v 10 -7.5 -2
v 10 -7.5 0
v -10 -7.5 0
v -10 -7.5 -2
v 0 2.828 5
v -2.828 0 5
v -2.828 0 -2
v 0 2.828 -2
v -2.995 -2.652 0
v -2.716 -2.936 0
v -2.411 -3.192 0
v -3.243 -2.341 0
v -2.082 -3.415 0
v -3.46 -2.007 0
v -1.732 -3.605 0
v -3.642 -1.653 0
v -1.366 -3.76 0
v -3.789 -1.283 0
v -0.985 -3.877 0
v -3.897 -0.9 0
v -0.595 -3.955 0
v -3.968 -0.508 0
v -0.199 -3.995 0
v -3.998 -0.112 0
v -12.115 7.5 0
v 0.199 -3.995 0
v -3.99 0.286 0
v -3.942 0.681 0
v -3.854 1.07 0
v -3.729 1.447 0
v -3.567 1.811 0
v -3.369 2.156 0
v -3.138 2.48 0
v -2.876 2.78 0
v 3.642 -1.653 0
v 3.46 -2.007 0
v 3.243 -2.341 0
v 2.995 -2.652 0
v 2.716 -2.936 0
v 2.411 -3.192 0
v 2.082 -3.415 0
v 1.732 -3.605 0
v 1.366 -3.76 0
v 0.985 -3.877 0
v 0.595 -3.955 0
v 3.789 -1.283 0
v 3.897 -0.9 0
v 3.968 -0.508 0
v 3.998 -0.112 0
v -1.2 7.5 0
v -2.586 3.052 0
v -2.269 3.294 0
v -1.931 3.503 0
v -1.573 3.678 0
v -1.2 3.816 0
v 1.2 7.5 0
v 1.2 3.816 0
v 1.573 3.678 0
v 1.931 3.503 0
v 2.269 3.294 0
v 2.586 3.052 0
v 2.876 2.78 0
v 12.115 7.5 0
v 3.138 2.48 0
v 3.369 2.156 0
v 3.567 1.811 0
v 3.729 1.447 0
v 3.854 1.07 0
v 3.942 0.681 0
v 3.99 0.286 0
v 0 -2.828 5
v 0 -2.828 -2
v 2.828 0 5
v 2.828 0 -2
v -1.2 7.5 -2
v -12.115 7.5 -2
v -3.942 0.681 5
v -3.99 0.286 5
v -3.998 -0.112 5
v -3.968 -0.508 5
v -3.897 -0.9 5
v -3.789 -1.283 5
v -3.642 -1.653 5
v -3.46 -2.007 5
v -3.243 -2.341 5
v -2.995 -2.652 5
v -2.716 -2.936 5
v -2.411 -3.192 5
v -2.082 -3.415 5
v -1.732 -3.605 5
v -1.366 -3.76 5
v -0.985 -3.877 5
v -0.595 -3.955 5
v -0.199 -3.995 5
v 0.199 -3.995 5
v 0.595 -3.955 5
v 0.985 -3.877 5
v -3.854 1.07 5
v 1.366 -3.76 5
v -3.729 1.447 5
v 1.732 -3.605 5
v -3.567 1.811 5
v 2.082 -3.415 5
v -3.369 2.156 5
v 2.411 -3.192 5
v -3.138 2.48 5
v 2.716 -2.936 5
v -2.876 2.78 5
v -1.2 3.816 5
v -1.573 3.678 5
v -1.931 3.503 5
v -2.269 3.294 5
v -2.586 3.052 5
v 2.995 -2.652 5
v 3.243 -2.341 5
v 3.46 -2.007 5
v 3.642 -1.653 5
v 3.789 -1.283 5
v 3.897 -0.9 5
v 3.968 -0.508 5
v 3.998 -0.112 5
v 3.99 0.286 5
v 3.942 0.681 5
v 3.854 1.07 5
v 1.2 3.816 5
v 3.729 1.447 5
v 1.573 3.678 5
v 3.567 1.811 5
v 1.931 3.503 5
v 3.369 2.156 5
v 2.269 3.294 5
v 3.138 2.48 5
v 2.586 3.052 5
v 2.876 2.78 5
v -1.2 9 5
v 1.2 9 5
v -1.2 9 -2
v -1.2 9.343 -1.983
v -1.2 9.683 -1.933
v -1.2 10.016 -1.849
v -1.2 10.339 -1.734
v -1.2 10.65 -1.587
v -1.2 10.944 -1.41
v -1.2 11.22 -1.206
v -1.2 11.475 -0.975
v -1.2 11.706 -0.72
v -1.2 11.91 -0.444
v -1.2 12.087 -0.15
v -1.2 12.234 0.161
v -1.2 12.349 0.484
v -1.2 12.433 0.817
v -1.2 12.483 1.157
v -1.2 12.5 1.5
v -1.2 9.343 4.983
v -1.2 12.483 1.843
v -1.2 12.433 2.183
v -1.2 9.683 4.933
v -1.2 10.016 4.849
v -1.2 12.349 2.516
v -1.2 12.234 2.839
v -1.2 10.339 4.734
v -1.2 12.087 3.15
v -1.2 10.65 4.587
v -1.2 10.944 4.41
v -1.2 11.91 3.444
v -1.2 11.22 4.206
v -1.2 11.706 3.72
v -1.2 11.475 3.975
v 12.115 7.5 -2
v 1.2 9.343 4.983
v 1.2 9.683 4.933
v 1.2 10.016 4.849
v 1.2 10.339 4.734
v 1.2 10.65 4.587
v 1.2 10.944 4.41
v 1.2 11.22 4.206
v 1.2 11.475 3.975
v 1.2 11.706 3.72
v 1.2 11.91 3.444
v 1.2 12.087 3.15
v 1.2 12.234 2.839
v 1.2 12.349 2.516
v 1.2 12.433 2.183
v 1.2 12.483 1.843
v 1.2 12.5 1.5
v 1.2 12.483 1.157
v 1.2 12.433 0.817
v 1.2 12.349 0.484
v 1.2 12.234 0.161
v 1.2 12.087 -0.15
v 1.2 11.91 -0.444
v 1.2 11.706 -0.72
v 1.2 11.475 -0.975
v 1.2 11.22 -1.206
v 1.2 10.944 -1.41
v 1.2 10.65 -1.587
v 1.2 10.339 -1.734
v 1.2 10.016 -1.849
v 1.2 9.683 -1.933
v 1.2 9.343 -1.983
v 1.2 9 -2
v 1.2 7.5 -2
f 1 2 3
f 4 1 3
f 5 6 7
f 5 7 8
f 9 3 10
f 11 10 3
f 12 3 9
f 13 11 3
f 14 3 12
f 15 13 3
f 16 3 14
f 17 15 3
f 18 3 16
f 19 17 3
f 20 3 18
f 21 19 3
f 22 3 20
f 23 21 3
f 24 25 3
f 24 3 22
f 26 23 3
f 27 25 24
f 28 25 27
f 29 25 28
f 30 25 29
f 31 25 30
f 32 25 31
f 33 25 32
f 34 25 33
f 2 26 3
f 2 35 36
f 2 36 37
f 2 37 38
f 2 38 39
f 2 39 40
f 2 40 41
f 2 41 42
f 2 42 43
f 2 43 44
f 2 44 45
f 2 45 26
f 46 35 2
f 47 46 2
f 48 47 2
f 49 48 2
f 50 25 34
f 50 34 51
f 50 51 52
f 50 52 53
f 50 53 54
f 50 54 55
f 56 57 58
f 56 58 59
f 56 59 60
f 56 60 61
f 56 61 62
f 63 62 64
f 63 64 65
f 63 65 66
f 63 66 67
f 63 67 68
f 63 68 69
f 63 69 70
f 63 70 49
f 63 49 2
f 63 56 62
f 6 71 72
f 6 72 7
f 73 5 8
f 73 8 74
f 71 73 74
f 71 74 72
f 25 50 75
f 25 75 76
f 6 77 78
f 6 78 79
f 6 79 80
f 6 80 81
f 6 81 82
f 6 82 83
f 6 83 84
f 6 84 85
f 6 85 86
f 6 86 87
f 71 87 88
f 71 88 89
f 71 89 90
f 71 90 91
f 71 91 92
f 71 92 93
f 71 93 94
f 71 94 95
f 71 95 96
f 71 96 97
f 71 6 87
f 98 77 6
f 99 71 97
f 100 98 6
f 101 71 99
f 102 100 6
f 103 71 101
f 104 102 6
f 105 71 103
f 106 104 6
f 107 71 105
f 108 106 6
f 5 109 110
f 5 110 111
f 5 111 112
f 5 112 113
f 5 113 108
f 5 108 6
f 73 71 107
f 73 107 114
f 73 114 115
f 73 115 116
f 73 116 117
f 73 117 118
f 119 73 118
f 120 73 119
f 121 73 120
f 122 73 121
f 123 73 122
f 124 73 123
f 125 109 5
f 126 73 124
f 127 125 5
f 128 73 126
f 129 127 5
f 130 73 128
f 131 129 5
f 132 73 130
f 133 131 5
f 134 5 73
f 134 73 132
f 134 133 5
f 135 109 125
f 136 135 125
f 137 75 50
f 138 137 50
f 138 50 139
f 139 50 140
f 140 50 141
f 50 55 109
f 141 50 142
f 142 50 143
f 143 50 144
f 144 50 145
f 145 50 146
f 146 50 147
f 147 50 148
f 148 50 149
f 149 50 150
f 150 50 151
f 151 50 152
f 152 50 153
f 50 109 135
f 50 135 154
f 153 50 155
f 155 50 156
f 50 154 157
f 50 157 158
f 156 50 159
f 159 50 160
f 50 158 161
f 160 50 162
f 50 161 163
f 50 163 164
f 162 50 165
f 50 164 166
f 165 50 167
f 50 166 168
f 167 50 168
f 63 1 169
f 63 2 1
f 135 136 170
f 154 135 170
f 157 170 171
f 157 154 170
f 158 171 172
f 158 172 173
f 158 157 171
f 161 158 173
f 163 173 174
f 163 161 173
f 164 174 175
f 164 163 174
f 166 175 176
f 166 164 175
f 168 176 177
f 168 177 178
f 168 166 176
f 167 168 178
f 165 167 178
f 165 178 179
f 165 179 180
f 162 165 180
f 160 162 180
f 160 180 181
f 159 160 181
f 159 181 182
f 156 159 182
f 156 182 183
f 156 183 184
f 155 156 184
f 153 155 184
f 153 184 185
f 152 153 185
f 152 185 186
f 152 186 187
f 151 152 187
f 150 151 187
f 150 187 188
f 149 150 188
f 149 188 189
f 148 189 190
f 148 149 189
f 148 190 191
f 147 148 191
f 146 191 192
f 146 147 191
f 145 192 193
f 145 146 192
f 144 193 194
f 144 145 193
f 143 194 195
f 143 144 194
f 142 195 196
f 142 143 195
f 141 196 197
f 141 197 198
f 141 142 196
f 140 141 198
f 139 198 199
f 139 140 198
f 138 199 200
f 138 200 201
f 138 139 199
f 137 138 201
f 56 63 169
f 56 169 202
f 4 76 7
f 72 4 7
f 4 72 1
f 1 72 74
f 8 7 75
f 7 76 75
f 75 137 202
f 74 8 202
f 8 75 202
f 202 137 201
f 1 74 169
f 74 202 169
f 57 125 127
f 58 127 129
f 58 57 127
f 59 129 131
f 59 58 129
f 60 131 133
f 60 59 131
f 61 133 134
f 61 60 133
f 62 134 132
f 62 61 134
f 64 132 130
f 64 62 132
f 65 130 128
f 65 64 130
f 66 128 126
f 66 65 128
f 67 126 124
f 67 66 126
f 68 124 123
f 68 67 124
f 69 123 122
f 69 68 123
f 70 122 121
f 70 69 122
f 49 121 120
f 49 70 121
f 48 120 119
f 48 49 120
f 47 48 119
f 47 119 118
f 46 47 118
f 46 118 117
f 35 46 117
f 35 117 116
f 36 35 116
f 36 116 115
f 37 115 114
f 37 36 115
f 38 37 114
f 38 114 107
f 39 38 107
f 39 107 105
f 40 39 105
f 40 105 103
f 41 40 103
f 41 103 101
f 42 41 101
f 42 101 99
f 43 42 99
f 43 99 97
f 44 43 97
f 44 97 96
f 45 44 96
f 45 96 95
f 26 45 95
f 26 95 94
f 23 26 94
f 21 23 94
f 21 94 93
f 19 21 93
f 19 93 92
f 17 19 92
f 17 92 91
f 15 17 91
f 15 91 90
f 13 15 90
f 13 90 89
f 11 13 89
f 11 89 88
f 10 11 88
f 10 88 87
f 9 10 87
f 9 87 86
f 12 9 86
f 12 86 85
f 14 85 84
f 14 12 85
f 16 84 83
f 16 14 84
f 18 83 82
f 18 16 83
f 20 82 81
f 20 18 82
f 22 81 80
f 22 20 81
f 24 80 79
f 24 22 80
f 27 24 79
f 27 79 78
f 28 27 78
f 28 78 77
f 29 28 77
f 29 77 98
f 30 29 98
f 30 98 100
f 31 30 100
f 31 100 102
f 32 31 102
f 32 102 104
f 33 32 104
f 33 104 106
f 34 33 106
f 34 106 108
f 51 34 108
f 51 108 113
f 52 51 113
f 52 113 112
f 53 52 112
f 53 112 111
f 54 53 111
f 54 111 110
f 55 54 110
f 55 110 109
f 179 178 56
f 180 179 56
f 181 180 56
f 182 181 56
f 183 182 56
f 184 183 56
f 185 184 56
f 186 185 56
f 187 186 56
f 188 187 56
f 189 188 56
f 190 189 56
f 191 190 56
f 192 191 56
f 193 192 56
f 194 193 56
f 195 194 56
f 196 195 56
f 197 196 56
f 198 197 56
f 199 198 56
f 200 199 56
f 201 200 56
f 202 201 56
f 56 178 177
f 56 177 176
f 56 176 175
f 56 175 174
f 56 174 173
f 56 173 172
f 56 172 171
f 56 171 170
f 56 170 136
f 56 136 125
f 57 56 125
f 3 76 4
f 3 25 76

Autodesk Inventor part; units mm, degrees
ref_plane "YZ Plane" through (0, 0, 0) normal (1, 0, 0) x (0, 1, 0)
ref_plane "XZ Plane" through (0, 0, 0) normal (0, 1, 0) x (-1, 0, 0)
ref_plane "XY Plane" through (0, 0, 0) normal (0, 0, 1) x (1, 0, 0)
sketch "スケッチ1" plane through (0, 0, 0) normal (0, 0, 1) x (1, 0, 0)
  line L0 (2.8284, 0) -> (0, -2.8284)
  line L1 (0, -2.8284) -> (-2.8284, 0)
  line L2 (-2.8284, 0) -> (0, 2.8284)
  line L3 (0, 2.8284) -> (2.8284, 0)
  line L4 (-12.1149, 7.5) -> (-10, -7.5)
  line L5 (10, -7.5) -> (-10, -7.5)
  line L6 (10, -7.5) -> (12.1149, 7.5)
  line L7 (12.1149, 7.5) -> (-12.1149, 7.5)
  point P0 (0, 0)
  point P1 (0, 7.5)
  point P2 (11.0574, 0)
  dimension "d10" = 24.2298
  dimension "d11" = 20
  dimension "d12" = 15
  dimension "d13" = 4
extrude "押し出し1" add sketch "スケッチ1" against normal blind 2
sketch "スケッチ3" plane through (0, 0, 0) normal (0, 0, 1) x (1, 0, 0)
  line L0 (2.8284, 0) -> (0, -2.8284) projected
  line L1 (0, -2.8284) -> (-2.8284, 0) projected
  line L2 (-2.8284, 0) -> (0, 2.8284) projected
  line L3 (0, 2.8284) -> (2.8284, 0) projected
  circle A0 centre (0, 0) radius 4
  dimension "d17" = 8
extrude "押し出し3" add sketch "スケッチ3" along normal blind 5
sketch "スケッチ4" plane through (0, 0, 5) normal (0, 0, 1) x (1, 0, 0)
  circle A0 centre (0, 0) radius 4 projected
  circle A1 centre (0, 0) radius 4 projected
  line L0 (-1.2, 3.8158) -> (-1.2, 12.5)
  line L1 (-1.2, 12.5) -> (1.2, 12.5)
  line L2 (1.2, 12.5) -> (1.2, 3.8158)
  line L3 (12.1149, 7.5) -> (-12.1149, 7.5) construction
  dimension "d18" = 5
  dimension "d19" = 2.4
extrude "押し出し4" add sketch "スケッチ4" against normal up to surface (7 mm away) contours A0 L0 L1 L2
sketch "スケッチ5" plane through (1.2, 3.8158, 5) normal (1, 0, 0) x (0, 0, -1)
  line L0 (7, 3.6842) -> (7, 8.6842) projected
  line L1 (0, 8.6842) -> (7, 8.6842) projected
  line L2 (0, 0) -> (0, 8.6842) projected
  arc A0 (7, 5.1842) -> (0, 5.1842) centre (3.5, 5.1842) ccw
  point P0 (5, -3.8158)
  point P1 (3.5, 8.6842)
extrude "押し出し5" cut sketch "スケッチ5" along normal through all both and the other way through all
sketch "スケッチ7" plane through (0, 0, 0) normal (0, 0, 1) x (1, 0, 0)
  line L0 (-1.2, 3.8158) -> (-1.2, 7.5) projected
  line L1 (-1.2, 7.5) -> (-12.1149, 7.5) projected
  line L2 (-12.1149, 7.5) -> (-10, -7.5) projected
  line L3 (-10, -7.5) -> (10, -7.5) projected
  line L4 (10, -7.5) -> (12.1149, 7.5) projected
  line L5 (12.1149, 7.5) -> (1.2, 7.5) projected
  line L6 (1.2, 7.5) -> (1.2, 3.8158) projected
  arc A0 (-1.2, 3.8158) -> (1.2, 3.8158) centre (0, 0) ccw projected
properties part number "om_BackHolder_V3"
